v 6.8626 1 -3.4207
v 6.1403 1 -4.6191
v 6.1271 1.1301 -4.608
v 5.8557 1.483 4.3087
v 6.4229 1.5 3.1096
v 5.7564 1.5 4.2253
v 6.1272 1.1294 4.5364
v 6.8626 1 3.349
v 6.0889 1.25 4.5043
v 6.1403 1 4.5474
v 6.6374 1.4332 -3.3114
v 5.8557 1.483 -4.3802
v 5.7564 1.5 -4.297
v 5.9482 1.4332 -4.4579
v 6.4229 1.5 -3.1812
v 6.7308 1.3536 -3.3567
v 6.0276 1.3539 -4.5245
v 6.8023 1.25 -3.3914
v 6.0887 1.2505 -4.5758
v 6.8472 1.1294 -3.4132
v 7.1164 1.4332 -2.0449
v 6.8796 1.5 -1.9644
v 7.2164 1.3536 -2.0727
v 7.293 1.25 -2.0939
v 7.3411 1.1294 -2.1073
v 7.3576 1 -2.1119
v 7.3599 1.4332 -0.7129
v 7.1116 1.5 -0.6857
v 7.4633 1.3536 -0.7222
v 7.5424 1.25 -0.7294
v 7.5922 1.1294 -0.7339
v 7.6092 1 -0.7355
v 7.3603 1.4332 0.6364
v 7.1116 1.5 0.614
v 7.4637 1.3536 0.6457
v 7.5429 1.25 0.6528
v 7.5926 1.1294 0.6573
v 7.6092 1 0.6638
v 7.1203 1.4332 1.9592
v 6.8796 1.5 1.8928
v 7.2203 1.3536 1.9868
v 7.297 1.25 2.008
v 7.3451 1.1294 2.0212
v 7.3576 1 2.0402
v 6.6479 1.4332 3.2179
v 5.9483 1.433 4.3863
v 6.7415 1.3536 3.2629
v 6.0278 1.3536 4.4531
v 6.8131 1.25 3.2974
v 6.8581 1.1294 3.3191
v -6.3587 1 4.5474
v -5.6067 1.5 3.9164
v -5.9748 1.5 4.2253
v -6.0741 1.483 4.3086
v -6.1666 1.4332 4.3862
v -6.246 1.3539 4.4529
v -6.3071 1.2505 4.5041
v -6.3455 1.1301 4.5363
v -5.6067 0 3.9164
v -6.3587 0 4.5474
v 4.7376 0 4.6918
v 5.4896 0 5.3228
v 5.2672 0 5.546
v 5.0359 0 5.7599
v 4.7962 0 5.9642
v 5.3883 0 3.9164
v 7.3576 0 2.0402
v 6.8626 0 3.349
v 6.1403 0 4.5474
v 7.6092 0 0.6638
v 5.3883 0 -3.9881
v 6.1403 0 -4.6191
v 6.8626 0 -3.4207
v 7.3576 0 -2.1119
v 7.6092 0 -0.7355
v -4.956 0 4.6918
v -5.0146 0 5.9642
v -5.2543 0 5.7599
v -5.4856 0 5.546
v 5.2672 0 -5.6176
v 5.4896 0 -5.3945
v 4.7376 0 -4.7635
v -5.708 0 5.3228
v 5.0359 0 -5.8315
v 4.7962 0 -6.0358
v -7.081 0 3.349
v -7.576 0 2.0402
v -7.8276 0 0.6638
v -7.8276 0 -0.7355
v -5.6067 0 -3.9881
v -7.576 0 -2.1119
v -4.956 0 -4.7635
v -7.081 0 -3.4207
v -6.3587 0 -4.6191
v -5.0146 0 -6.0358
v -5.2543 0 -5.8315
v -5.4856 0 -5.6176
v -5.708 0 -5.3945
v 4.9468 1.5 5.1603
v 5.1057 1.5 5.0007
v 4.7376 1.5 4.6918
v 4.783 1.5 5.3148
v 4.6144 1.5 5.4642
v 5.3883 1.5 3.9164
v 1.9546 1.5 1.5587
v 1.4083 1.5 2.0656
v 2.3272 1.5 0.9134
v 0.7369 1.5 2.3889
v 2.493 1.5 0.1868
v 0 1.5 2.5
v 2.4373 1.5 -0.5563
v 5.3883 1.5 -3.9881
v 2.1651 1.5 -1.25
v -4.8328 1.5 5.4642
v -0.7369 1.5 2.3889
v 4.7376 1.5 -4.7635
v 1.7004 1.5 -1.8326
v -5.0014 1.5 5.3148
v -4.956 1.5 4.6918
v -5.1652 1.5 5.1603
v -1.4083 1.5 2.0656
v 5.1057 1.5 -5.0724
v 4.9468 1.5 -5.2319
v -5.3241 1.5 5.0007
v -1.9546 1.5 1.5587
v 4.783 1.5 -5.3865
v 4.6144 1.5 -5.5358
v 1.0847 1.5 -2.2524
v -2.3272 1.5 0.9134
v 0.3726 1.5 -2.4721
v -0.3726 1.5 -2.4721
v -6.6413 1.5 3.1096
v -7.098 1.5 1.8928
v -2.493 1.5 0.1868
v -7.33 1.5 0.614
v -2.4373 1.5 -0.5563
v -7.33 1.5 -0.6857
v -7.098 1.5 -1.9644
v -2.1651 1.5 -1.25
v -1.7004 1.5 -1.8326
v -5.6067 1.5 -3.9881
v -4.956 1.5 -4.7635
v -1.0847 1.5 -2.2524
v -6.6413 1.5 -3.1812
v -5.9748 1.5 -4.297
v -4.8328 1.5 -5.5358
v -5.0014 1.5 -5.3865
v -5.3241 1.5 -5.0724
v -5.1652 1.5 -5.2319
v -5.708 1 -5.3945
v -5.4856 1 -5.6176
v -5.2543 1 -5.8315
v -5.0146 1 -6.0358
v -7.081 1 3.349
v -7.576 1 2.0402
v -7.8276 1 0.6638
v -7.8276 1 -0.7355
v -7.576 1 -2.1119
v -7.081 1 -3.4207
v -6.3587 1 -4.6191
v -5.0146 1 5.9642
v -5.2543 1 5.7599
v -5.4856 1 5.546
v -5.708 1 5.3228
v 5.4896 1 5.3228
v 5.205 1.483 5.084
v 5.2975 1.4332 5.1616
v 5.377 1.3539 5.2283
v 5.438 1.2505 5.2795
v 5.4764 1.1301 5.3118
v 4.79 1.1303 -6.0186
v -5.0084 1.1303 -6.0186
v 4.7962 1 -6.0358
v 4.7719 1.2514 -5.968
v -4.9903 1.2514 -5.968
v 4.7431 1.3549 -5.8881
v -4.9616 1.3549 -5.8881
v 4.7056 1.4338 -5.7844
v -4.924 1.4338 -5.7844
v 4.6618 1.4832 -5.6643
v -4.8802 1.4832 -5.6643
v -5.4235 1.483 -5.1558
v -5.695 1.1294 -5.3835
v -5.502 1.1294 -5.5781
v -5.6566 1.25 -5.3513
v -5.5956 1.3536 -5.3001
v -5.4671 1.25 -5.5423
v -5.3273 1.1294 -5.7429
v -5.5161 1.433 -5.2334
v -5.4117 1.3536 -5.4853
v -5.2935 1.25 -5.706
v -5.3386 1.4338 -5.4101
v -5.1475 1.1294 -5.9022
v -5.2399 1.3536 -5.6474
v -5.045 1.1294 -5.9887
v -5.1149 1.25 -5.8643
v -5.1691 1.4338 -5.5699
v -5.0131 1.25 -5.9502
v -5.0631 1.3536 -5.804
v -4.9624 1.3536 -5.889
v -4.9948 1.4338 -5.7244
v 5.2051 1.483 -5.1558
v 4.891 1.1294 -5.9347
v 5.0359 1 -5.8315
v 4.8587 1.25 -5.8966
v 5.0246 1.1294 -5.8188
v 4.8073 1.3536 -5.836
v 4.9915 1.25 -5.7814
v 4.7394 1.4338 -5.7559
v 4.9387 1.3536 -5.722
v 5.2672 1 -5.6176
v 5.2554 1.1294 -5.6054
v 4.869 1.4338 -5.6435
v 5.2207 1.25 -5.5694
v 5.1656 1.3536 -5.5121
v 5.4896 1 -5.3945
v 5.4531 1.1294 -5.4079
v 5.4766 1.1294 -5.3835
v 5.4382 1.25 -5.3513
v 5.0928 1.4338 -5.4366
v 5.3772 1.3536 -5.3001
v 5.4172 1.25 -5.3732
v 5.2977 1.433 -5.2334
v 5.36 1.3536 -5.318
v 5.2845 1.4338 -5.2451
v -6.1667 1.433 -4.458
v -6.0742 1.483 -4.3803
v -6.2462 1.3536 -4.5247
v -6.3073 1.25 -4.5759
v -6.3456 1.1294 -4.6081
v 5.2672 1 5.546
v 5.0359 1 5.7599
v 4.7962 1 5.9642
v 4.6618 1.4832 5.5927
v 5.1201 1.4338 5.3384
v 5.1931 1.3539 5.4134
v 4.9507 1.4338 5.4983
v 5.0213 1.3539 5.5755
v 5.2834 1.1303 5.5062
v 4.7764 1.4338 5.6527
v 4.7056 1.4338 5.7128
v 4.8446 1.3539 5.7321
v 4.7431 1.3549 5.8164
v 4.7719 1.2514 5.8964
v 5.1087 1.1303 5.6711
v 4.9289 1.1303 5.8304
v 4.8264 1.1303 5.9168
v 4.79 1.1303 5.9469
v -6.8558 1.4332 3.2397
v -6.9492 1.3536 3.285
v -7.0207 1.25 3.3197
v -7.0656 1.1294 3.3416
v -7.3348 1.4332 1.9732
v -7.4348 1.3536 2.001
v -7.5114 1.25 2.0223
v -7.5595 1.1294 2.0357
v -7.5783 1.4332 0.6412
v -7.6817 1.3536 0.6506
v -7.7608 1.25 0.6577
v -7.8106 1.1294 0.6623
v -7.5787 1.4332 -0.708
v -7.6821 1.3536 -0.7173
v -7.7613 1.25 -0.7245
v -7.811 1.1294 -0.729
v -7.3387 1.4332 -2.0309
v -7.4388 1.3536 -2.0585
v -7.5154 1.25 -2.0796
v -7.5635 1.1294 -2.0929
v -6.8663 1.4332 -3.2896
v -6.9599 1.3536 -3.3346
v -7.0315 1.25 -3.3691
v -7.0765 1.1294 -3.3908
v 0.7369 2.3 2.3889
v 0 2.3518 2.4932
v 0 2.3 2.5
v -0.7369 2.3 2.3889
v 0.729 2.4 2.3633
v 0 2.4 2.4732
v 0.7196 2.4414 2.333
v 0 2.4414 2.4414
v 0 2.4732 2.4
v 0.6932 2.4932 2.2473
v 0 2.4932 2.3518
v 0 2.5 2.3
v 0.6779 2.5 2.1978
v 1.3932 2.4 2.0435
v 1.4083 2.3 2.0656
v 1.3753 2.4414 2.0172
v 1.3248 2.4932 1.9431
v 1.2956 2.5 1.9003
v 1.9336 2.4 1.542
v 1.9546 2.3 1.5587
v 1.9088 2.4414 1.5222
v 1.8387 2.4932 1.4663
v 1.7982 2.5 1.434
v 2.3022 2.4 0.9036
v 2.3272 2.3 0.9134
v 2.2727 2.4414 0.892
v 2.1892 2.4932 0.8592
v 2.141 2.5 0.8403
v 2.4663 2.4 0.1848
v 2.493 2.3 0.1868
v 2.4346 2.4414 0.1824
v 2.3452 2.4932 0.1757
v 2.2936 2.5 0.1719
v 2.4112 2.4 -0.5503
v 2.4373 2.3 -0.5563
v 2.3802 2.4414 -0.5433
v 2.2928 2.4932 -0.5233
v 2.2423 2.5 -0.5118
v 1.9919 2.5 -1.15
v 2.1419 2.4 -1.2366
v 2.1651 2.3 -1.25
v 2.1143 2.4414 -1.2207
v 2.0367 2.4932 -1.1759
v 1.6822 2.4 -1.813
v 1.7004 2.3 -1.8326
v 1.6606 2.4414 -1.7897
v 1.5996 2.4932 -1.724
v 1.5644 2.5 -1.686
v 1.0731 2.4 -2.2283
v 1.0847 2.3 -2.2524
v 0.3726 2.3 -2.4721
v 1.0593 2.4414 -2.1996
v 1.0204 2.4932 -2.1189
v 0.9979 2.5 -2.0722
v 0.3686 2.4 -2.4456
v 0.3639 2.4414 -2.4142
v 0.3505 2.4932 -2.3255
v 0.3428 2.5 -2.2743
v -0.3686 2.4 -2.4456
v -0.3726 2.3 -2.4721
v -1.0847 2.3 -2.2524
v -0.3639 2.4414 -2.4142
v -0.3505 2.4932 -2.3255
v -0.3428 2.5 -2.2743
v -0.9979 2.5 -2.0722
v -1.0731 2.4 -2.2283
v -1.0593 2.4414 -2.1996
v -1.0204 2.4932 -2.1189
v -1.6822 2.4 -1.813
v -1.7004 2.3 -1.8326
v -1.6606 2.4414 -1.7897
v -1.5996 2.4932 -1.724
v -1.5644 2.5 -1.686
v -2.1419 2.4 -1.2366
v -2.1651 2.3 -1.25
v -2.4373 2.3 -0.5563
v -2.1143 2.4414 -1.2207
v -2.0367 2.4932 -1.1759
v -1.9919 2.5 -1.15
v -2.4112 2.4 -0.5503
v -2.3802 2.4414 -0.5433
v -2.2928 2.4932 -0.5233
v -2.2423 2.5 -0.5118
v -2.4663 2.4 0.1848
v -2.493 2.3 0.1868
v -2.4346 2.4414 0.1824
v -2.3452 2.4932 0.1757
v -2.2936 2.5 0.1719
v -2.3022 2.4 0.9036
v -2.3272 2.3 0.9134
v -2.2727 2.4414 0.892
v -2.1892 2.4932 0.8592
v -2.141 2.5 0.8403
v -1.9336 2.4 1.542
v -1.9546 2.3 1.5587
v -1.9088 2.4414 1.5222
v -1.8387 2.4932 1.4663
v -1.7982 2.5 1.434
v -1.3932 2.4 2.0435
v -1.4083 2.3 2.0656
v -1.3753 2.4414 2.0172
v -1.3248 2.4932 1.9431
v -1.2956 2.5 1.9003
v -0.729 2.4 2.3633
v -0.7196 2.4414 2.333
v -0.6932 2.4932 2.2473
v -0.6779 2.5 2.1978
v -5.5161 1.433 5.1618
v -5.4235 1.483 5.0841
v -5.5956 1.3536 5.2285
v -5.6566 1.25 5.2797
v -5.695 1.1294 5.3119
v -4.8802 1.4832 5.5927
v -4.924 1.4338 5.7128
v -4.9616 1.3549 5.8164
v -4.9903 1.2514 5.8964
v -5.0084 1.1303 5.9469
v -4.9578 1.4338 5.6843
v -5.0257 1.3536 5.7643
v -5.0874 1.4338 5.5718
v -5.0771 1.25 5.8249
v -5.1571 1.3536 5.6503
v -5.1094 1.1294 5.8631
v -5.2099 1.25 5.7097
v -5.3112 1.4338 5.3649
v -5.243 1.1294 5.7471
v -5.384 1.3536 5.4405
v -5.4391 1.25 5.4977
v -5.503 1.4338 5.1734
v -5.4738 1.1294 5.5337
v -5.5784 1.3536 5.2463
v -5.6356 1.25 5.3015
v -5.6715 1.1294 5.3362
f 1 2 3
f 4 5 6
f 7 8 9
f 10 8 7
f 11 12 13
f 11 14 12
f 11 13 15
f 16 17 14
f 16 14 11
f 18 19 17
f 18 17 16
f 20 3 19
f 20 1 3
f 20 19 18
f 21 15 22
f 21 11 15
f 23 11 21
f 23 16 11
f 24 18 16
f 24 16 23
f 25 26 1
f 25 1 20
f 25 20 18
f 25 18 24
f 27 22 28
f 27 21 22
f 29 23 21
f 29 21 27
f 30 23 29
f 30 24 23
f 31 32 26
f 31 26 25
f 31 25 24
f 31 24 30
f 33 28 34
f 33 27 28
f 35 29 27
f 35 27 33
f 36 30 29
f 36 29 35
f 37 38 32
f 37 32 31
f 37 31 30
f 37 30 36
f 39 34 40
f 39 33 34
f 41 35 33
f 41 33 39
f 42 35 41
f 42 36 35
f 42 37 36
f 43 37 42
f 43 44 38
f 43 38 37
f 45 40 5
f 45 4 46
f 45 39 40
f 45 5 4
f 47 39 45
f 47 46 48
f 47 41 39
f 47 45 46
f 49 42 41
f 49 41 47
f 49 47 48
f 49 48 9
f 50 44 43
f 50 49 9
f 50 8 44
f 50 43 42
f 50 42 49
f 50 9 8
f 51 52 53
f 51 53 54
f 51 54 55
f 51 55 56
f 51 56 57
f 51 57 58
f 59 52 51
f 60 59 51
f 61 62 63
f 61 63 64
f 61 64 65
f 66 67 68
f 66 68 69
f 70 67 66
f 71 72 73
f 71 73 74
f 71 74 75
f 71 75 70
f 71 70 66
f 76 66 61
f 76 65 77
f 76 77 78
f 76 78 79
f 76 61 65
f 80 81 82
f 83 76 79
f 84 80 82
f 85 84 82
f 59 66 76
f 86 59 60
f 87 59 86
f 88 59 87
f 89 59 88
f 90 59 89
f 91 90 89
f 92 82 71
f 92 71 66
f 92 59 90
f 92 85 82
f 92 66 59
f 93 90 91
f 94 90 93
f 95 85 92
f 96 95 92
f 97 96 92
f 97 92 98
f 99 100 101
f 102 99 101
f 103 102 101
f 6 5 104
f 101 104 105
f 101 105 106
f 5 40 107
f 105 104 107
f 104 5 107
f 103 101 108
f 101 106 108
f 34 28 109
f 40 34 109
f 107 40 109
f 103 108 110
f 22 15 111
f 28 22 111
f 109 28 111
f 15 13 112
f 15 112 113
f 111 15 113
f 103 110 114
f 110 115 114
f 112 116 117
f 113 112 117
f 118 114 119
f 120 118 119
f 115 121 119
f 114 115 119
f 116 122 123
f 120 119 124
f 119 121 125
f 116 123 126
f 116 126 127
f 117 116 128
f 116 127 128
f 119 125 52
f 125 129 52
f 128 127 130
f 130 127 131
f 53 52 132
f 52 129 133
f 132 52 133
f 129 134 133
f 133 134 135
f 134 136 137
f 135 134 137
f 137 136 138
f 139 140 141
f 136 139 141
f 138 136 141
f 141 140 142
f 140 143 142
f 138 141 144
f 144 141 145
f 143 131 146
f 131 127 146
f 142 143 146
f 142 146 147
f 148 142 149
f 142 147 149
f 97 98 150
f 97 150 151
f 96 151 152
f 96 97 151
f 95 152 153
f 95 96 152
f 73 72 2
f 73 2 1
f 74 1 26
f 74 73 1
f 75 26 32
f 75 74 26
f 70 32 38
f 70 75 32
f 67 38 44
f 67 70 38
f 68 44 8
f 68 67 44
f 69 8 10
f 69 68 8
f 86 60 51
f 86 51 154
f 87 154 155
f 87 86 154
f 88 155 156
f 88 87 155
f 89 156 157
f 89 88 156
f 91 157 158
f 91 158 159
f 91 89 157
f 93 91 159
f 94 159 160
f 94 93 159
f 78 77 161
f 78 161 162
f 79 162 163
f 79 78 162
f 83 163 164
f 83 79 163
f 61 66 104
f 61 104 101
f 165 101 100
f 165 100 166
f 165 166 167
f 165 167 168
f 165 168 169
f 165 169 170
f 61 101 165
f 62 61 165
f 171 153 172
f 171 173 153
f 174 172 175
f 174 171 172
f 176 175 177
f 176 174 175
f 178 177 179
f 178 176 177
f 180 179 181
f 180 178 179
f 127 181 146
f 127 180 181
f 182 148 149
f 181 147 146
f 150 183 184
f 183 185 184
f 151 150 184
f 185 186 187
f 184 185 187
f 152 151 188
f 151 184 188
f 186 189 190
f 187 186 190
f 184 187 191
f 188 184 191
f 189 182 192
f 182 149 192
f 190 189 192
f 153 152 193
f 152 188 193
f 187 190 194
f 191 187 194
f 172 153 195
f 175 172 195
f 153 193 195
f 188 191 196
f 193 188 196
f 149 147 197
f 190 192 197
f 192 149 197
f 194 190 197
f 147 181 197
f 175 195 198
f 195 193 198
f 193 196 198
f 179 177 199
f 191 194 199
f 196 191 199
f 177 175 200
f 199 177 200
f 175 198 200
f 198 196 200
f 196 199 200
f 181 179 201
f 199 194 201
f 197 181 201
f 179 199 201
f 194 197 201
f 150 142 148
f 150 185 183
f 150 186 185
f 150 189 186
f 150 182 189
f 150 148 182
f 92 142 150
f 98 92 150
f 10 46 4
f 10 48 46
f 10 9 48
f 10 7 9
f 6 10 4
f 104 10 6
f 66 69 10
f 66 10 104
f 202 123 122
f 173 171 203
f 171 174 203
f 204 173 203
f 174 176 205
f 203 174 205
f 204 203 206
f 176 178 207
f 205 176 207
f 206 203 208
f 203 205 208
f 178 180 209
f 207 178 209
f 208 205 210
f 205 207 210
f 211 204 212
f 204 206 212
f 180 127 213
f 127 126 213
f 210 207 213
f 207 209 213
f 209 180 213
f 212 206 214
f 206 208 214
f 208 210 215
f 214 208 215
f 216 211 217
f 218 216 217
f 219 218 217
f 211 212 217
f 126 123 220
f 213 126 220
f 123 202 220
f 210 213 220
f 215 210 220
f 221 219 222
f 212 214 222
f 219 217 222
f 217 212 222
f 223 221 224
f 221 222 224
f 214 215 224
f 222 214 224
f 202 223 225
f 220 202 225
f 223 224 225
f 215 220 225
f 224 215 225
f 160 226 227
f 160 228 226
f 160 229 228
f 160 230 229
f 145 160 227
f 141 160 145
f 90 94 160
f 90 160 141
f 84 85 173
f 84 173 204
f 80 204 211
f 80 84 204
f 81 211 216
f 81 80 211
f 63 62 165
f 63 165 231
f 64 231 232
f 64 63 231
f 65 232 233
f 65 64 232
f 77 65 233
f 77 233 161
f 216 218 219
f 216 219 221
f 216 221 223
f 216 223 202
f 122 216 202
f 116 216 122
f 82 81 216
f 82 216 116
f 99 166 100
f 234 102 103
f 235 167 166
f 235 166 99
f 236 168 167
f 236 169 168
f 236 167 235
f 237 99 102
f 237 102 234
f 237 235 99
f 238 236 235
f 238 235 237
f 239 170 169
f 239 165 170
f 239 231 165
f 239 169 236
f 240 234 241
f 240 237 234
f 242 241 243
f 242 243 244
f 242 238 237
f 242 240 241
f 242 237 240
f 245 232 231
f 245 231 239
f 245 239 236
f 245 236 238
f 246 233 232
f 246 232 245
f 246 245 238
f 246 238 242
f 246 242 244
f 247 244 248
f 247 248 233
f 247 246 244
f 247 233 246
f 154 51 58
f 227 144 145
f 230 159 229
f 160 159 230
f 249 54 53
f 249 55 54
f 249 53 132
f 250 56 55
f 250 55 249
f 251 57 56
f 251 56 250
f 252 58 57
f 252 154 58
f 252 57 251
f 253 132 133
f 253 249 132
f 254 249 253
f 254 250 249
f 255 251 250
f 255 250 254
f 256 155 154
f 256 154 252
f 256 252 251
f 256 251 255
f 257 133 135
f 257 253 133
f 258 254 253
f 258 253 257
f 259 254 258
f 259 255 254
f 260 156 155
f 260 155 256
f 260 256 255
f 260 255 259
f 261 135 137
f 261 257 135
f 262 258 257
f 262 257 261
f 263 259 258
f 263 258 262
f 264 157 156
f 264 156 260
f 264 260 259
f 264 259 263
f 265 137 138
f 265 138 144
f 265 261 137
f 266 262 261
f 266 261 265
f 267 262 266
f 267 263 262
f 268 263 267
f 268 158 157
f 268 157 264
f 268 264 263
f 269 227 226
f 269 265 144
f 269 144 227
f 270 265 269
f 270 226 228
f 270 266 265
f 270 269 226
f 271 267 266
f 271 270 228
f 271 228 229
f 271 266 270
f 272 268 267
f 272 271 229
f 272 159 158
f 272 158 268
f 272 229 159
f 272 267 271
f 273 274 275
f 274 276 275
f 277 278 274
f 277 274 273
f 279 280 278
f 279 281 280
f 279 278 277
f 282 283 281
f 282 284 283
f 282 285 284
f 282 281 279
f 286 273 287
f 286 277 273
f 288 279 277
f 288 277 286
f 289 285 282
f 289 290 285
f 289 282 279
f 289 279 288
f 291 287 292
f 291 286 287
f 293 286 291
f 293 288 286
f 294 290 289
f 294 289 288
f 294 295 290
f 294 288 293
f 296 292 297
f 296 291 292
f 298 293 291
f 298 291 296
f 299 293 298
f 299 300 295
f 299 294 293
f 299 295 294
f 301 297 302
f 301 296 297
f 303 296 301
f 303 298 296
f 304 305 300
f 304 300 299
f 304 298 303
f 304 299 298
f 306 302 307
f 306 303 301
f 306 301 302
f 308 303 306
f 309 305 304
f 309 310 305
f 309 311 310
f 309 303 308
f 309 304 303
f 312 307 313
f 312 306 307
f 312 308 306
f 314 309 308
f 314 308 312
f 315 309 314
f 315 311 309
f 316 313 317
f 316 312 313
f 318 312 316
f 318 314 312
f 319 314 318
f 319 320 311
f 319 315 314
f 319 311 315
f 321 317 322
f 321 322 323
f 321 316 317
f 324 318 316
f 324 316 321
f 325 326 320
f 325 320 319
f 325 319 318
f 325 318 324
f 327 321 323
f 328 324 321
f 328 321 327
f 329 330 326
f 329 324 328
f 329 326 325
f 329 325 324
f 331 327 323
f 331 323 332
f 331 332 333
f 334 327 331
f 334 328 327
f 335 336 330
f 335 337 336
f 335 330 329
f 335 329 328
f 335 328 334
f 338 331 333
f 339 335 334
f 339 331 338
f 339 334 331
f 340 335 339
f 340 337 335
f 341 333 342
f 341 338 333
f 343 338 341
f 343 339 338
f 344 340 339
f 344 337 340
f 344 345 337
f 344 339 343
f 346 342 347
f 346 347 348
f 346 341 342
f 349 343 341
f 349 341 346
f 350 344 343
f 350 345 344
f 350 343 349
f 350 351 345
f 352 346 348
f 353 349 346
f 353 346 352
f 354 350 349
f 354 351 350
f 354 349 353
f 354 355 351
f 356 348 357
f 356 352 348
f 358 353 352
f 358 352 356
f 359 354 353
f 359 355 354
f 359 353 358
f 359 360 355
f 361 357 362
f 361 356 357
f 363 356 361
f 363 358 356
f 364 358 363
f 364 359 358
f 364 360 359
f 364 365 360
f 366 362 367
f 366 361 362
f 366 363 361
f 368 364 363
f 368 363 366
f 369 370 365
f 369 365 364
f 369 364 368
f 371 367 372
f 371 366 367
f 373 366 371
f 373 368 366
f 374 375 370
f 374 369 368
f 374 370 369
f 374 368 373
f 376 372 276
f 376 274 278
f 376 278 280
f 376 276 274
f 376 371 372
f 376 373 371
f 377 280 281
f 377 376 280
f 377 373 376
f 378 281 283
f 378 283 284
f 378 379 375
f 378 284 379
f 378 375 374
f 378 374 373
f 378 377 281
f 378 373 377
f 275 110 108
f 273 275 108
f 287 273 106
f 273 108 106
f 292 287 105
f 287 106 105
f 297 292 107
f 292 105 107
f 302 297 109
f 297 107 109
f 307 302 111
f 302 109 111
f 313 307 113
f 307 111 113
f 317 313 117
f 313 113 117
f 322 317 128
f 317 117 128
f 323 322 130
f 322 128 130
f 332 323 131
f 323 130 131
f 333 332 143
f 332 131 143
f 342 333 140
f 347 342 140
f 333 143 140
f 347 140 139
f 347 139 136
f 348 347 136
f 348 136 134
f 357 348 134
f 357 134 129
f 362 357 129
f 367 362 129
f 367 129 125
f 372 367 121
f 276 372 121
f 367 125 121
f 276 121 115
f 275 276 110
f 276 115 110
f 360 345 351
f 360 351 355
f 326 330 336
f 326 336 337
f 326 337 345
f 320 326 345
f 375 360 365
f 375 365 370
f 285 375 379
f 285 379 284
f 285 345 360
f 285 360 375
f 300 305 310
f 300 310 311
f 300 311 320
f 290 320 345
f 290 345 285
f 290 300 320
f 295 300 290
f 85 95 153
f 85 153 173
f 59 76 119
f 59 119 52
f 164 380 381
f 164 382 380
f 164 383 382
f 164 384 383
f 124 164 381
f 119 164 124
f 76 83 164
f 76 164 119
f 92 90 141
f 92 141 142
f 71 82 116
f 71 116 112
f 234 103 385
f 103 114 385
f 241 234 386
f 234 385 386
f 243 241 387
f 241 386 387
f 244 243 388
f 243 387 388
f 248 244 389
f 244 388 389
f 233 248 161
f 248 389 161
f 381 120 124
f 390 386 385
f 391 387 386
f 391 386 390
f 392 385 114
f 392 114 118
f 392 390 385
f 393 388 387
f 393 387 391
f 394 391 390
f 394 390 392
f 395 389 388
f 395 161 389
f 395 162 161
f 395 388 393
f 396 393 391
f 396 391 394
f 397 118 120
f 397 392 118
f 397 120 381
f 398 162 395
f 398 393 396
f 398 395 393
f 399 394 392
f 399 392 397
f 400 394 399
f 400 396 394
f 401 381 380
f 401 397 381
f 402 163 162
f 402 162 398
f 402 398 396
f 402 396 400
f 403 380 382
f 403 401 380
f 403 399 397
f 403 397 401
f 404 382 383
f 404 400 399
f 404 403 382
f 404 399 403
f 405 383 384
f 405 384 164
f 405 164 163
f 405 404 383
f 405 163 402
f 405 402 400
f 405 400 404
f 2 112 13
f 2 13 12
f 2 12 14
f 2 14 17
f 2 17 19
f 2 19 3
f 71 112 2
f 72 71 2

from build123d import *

# Parameters (mm, degrees)
SALIENTE_EXTRUIR1_DEPTH = 1.5
CROQUIS3_R              = 2.5
SALIENTE_EXTRUIR2_DEPTH = 1
REDONDEO2_R             = 0.5
REDONDEO3_R             = 0.2


with BuildPart() as part:
    # Croquis2 → Saliente-Extruir1 (new body)
    with BuildSketch(Plane(origin=(0, 0, 0), x_dir=(1, 0, 0), z_dir=(0, 1, 0))):
        with BuildLine():
            Line((-5.014556606, 6.035834257), (4.79615183, 6.035834257))
            ThreePointArc((4.79615183, 6.035834257), (5.152675046, 5.725750413), (5.489639121, 5.394516348))
            Line((5.489639121, 5.394516348), (4.737625192, 4.763501737))
            Line((4.737625192, 4.763501737), (5.388283977, 3.988076792))
            Line((5.388283977, 3.988076792), (6.140297907, 4.619091403))
            ThreePointArc((6.140297907, 4.619091403), (7.640797612, 0.035834257), (6.140297907, -4.547422889))
            Line((6.140297907, -4.547422889), (5.388283977, -3.916408278))
            Line((5.388283977, -3.916408278), (4.737625192, -4.691833224))
            Line((4.737625192, -4.691833224), (5.489639121, -5.322847835))
            ThreePointArc((5.489639121, -5.322847835), (5.152675046, -5.6540819), (4.79615183, -5.964165743))
            Line((4.79615183, -5.964165743), (-5.014556606, -5.964165743))
            ThreePointArc((-5.014556606, -5.964165743), (-5.371079822, -5.6540819), (-5.708043897, -5.322847835))
            Line((-5.708043897, -5.322847835), (-4.956029967, -4.691833224))
            Line((-4.956029967, -4.691833224), (-5.606688753, -3.916408278))
            Line((-5.606688753, -3.916408278), (-6.358702683, -4.547422889))
            ThreePointArc((-6.358702683, -4.547422889), (-7.859202388, 0.035834257), (-6.358702683, 4.619091403))
            Line((-6.358702683, 4.619091403), (-5.606688753, 3.988076792))
            Line((-5.606688753, 3.988076792), (-4.956029967, 4.763501737))
            Line((-4.956029967, 4.763501737), (-5.708043897, 5.394516348))
            ThreePointArc((-5.708043897, 5.394516348), (-5.371079822, 5.725750413), (-5.014556606, 6.035834257))
        make_face()
    extrude(amount=SALIENTE_EXTRUIR1_DEPTH)

    # Croquis3 → Saliente-Extruir2 (add)
    with BuildSketch(Plane(origin=(0, 1.5, 0), x_dir=(1, 0, 0), z_dir=(0, 1, 0))):
        with Locations(Location((0, 0, 0), (0, 0, 270))):
            Circle(CROQUIS3_R)
    extrude(amount=SALIENTE_EXTRUIR2_DEPTH)

    # Redondeo2
    redondeo2_edges = [part.edges().sort_by_distance(p)[0] for p in [
        (-7.859202388, 1.5, -0.035834257),
        (-5.371079822, 1.5, 5.6540819),
        (-0.109202388, 1.5, 5.964165743),
        (5.152675046, 1.5, 5.6540819),
        (-5.371079822, 1.5, -5.725750413),
        (7.640797612, 1.5, -0.035834257),
        (5.152675046, 1.5, -5.725750413),
        (-0.109202388, 1.5, -6.035834257),
    ]]
    fillet(redondeo2_edges, radius=REDONDEO2_R)

    # Redondeo3
    redondeo3_edges = [part.edges().sort_by_distance(p)[0] for p in [
        (0, 2.5, -2.5),
    ]]
    fillet(redondeo3_edges, radius=REDONDEO3_R)


solid = part.part
